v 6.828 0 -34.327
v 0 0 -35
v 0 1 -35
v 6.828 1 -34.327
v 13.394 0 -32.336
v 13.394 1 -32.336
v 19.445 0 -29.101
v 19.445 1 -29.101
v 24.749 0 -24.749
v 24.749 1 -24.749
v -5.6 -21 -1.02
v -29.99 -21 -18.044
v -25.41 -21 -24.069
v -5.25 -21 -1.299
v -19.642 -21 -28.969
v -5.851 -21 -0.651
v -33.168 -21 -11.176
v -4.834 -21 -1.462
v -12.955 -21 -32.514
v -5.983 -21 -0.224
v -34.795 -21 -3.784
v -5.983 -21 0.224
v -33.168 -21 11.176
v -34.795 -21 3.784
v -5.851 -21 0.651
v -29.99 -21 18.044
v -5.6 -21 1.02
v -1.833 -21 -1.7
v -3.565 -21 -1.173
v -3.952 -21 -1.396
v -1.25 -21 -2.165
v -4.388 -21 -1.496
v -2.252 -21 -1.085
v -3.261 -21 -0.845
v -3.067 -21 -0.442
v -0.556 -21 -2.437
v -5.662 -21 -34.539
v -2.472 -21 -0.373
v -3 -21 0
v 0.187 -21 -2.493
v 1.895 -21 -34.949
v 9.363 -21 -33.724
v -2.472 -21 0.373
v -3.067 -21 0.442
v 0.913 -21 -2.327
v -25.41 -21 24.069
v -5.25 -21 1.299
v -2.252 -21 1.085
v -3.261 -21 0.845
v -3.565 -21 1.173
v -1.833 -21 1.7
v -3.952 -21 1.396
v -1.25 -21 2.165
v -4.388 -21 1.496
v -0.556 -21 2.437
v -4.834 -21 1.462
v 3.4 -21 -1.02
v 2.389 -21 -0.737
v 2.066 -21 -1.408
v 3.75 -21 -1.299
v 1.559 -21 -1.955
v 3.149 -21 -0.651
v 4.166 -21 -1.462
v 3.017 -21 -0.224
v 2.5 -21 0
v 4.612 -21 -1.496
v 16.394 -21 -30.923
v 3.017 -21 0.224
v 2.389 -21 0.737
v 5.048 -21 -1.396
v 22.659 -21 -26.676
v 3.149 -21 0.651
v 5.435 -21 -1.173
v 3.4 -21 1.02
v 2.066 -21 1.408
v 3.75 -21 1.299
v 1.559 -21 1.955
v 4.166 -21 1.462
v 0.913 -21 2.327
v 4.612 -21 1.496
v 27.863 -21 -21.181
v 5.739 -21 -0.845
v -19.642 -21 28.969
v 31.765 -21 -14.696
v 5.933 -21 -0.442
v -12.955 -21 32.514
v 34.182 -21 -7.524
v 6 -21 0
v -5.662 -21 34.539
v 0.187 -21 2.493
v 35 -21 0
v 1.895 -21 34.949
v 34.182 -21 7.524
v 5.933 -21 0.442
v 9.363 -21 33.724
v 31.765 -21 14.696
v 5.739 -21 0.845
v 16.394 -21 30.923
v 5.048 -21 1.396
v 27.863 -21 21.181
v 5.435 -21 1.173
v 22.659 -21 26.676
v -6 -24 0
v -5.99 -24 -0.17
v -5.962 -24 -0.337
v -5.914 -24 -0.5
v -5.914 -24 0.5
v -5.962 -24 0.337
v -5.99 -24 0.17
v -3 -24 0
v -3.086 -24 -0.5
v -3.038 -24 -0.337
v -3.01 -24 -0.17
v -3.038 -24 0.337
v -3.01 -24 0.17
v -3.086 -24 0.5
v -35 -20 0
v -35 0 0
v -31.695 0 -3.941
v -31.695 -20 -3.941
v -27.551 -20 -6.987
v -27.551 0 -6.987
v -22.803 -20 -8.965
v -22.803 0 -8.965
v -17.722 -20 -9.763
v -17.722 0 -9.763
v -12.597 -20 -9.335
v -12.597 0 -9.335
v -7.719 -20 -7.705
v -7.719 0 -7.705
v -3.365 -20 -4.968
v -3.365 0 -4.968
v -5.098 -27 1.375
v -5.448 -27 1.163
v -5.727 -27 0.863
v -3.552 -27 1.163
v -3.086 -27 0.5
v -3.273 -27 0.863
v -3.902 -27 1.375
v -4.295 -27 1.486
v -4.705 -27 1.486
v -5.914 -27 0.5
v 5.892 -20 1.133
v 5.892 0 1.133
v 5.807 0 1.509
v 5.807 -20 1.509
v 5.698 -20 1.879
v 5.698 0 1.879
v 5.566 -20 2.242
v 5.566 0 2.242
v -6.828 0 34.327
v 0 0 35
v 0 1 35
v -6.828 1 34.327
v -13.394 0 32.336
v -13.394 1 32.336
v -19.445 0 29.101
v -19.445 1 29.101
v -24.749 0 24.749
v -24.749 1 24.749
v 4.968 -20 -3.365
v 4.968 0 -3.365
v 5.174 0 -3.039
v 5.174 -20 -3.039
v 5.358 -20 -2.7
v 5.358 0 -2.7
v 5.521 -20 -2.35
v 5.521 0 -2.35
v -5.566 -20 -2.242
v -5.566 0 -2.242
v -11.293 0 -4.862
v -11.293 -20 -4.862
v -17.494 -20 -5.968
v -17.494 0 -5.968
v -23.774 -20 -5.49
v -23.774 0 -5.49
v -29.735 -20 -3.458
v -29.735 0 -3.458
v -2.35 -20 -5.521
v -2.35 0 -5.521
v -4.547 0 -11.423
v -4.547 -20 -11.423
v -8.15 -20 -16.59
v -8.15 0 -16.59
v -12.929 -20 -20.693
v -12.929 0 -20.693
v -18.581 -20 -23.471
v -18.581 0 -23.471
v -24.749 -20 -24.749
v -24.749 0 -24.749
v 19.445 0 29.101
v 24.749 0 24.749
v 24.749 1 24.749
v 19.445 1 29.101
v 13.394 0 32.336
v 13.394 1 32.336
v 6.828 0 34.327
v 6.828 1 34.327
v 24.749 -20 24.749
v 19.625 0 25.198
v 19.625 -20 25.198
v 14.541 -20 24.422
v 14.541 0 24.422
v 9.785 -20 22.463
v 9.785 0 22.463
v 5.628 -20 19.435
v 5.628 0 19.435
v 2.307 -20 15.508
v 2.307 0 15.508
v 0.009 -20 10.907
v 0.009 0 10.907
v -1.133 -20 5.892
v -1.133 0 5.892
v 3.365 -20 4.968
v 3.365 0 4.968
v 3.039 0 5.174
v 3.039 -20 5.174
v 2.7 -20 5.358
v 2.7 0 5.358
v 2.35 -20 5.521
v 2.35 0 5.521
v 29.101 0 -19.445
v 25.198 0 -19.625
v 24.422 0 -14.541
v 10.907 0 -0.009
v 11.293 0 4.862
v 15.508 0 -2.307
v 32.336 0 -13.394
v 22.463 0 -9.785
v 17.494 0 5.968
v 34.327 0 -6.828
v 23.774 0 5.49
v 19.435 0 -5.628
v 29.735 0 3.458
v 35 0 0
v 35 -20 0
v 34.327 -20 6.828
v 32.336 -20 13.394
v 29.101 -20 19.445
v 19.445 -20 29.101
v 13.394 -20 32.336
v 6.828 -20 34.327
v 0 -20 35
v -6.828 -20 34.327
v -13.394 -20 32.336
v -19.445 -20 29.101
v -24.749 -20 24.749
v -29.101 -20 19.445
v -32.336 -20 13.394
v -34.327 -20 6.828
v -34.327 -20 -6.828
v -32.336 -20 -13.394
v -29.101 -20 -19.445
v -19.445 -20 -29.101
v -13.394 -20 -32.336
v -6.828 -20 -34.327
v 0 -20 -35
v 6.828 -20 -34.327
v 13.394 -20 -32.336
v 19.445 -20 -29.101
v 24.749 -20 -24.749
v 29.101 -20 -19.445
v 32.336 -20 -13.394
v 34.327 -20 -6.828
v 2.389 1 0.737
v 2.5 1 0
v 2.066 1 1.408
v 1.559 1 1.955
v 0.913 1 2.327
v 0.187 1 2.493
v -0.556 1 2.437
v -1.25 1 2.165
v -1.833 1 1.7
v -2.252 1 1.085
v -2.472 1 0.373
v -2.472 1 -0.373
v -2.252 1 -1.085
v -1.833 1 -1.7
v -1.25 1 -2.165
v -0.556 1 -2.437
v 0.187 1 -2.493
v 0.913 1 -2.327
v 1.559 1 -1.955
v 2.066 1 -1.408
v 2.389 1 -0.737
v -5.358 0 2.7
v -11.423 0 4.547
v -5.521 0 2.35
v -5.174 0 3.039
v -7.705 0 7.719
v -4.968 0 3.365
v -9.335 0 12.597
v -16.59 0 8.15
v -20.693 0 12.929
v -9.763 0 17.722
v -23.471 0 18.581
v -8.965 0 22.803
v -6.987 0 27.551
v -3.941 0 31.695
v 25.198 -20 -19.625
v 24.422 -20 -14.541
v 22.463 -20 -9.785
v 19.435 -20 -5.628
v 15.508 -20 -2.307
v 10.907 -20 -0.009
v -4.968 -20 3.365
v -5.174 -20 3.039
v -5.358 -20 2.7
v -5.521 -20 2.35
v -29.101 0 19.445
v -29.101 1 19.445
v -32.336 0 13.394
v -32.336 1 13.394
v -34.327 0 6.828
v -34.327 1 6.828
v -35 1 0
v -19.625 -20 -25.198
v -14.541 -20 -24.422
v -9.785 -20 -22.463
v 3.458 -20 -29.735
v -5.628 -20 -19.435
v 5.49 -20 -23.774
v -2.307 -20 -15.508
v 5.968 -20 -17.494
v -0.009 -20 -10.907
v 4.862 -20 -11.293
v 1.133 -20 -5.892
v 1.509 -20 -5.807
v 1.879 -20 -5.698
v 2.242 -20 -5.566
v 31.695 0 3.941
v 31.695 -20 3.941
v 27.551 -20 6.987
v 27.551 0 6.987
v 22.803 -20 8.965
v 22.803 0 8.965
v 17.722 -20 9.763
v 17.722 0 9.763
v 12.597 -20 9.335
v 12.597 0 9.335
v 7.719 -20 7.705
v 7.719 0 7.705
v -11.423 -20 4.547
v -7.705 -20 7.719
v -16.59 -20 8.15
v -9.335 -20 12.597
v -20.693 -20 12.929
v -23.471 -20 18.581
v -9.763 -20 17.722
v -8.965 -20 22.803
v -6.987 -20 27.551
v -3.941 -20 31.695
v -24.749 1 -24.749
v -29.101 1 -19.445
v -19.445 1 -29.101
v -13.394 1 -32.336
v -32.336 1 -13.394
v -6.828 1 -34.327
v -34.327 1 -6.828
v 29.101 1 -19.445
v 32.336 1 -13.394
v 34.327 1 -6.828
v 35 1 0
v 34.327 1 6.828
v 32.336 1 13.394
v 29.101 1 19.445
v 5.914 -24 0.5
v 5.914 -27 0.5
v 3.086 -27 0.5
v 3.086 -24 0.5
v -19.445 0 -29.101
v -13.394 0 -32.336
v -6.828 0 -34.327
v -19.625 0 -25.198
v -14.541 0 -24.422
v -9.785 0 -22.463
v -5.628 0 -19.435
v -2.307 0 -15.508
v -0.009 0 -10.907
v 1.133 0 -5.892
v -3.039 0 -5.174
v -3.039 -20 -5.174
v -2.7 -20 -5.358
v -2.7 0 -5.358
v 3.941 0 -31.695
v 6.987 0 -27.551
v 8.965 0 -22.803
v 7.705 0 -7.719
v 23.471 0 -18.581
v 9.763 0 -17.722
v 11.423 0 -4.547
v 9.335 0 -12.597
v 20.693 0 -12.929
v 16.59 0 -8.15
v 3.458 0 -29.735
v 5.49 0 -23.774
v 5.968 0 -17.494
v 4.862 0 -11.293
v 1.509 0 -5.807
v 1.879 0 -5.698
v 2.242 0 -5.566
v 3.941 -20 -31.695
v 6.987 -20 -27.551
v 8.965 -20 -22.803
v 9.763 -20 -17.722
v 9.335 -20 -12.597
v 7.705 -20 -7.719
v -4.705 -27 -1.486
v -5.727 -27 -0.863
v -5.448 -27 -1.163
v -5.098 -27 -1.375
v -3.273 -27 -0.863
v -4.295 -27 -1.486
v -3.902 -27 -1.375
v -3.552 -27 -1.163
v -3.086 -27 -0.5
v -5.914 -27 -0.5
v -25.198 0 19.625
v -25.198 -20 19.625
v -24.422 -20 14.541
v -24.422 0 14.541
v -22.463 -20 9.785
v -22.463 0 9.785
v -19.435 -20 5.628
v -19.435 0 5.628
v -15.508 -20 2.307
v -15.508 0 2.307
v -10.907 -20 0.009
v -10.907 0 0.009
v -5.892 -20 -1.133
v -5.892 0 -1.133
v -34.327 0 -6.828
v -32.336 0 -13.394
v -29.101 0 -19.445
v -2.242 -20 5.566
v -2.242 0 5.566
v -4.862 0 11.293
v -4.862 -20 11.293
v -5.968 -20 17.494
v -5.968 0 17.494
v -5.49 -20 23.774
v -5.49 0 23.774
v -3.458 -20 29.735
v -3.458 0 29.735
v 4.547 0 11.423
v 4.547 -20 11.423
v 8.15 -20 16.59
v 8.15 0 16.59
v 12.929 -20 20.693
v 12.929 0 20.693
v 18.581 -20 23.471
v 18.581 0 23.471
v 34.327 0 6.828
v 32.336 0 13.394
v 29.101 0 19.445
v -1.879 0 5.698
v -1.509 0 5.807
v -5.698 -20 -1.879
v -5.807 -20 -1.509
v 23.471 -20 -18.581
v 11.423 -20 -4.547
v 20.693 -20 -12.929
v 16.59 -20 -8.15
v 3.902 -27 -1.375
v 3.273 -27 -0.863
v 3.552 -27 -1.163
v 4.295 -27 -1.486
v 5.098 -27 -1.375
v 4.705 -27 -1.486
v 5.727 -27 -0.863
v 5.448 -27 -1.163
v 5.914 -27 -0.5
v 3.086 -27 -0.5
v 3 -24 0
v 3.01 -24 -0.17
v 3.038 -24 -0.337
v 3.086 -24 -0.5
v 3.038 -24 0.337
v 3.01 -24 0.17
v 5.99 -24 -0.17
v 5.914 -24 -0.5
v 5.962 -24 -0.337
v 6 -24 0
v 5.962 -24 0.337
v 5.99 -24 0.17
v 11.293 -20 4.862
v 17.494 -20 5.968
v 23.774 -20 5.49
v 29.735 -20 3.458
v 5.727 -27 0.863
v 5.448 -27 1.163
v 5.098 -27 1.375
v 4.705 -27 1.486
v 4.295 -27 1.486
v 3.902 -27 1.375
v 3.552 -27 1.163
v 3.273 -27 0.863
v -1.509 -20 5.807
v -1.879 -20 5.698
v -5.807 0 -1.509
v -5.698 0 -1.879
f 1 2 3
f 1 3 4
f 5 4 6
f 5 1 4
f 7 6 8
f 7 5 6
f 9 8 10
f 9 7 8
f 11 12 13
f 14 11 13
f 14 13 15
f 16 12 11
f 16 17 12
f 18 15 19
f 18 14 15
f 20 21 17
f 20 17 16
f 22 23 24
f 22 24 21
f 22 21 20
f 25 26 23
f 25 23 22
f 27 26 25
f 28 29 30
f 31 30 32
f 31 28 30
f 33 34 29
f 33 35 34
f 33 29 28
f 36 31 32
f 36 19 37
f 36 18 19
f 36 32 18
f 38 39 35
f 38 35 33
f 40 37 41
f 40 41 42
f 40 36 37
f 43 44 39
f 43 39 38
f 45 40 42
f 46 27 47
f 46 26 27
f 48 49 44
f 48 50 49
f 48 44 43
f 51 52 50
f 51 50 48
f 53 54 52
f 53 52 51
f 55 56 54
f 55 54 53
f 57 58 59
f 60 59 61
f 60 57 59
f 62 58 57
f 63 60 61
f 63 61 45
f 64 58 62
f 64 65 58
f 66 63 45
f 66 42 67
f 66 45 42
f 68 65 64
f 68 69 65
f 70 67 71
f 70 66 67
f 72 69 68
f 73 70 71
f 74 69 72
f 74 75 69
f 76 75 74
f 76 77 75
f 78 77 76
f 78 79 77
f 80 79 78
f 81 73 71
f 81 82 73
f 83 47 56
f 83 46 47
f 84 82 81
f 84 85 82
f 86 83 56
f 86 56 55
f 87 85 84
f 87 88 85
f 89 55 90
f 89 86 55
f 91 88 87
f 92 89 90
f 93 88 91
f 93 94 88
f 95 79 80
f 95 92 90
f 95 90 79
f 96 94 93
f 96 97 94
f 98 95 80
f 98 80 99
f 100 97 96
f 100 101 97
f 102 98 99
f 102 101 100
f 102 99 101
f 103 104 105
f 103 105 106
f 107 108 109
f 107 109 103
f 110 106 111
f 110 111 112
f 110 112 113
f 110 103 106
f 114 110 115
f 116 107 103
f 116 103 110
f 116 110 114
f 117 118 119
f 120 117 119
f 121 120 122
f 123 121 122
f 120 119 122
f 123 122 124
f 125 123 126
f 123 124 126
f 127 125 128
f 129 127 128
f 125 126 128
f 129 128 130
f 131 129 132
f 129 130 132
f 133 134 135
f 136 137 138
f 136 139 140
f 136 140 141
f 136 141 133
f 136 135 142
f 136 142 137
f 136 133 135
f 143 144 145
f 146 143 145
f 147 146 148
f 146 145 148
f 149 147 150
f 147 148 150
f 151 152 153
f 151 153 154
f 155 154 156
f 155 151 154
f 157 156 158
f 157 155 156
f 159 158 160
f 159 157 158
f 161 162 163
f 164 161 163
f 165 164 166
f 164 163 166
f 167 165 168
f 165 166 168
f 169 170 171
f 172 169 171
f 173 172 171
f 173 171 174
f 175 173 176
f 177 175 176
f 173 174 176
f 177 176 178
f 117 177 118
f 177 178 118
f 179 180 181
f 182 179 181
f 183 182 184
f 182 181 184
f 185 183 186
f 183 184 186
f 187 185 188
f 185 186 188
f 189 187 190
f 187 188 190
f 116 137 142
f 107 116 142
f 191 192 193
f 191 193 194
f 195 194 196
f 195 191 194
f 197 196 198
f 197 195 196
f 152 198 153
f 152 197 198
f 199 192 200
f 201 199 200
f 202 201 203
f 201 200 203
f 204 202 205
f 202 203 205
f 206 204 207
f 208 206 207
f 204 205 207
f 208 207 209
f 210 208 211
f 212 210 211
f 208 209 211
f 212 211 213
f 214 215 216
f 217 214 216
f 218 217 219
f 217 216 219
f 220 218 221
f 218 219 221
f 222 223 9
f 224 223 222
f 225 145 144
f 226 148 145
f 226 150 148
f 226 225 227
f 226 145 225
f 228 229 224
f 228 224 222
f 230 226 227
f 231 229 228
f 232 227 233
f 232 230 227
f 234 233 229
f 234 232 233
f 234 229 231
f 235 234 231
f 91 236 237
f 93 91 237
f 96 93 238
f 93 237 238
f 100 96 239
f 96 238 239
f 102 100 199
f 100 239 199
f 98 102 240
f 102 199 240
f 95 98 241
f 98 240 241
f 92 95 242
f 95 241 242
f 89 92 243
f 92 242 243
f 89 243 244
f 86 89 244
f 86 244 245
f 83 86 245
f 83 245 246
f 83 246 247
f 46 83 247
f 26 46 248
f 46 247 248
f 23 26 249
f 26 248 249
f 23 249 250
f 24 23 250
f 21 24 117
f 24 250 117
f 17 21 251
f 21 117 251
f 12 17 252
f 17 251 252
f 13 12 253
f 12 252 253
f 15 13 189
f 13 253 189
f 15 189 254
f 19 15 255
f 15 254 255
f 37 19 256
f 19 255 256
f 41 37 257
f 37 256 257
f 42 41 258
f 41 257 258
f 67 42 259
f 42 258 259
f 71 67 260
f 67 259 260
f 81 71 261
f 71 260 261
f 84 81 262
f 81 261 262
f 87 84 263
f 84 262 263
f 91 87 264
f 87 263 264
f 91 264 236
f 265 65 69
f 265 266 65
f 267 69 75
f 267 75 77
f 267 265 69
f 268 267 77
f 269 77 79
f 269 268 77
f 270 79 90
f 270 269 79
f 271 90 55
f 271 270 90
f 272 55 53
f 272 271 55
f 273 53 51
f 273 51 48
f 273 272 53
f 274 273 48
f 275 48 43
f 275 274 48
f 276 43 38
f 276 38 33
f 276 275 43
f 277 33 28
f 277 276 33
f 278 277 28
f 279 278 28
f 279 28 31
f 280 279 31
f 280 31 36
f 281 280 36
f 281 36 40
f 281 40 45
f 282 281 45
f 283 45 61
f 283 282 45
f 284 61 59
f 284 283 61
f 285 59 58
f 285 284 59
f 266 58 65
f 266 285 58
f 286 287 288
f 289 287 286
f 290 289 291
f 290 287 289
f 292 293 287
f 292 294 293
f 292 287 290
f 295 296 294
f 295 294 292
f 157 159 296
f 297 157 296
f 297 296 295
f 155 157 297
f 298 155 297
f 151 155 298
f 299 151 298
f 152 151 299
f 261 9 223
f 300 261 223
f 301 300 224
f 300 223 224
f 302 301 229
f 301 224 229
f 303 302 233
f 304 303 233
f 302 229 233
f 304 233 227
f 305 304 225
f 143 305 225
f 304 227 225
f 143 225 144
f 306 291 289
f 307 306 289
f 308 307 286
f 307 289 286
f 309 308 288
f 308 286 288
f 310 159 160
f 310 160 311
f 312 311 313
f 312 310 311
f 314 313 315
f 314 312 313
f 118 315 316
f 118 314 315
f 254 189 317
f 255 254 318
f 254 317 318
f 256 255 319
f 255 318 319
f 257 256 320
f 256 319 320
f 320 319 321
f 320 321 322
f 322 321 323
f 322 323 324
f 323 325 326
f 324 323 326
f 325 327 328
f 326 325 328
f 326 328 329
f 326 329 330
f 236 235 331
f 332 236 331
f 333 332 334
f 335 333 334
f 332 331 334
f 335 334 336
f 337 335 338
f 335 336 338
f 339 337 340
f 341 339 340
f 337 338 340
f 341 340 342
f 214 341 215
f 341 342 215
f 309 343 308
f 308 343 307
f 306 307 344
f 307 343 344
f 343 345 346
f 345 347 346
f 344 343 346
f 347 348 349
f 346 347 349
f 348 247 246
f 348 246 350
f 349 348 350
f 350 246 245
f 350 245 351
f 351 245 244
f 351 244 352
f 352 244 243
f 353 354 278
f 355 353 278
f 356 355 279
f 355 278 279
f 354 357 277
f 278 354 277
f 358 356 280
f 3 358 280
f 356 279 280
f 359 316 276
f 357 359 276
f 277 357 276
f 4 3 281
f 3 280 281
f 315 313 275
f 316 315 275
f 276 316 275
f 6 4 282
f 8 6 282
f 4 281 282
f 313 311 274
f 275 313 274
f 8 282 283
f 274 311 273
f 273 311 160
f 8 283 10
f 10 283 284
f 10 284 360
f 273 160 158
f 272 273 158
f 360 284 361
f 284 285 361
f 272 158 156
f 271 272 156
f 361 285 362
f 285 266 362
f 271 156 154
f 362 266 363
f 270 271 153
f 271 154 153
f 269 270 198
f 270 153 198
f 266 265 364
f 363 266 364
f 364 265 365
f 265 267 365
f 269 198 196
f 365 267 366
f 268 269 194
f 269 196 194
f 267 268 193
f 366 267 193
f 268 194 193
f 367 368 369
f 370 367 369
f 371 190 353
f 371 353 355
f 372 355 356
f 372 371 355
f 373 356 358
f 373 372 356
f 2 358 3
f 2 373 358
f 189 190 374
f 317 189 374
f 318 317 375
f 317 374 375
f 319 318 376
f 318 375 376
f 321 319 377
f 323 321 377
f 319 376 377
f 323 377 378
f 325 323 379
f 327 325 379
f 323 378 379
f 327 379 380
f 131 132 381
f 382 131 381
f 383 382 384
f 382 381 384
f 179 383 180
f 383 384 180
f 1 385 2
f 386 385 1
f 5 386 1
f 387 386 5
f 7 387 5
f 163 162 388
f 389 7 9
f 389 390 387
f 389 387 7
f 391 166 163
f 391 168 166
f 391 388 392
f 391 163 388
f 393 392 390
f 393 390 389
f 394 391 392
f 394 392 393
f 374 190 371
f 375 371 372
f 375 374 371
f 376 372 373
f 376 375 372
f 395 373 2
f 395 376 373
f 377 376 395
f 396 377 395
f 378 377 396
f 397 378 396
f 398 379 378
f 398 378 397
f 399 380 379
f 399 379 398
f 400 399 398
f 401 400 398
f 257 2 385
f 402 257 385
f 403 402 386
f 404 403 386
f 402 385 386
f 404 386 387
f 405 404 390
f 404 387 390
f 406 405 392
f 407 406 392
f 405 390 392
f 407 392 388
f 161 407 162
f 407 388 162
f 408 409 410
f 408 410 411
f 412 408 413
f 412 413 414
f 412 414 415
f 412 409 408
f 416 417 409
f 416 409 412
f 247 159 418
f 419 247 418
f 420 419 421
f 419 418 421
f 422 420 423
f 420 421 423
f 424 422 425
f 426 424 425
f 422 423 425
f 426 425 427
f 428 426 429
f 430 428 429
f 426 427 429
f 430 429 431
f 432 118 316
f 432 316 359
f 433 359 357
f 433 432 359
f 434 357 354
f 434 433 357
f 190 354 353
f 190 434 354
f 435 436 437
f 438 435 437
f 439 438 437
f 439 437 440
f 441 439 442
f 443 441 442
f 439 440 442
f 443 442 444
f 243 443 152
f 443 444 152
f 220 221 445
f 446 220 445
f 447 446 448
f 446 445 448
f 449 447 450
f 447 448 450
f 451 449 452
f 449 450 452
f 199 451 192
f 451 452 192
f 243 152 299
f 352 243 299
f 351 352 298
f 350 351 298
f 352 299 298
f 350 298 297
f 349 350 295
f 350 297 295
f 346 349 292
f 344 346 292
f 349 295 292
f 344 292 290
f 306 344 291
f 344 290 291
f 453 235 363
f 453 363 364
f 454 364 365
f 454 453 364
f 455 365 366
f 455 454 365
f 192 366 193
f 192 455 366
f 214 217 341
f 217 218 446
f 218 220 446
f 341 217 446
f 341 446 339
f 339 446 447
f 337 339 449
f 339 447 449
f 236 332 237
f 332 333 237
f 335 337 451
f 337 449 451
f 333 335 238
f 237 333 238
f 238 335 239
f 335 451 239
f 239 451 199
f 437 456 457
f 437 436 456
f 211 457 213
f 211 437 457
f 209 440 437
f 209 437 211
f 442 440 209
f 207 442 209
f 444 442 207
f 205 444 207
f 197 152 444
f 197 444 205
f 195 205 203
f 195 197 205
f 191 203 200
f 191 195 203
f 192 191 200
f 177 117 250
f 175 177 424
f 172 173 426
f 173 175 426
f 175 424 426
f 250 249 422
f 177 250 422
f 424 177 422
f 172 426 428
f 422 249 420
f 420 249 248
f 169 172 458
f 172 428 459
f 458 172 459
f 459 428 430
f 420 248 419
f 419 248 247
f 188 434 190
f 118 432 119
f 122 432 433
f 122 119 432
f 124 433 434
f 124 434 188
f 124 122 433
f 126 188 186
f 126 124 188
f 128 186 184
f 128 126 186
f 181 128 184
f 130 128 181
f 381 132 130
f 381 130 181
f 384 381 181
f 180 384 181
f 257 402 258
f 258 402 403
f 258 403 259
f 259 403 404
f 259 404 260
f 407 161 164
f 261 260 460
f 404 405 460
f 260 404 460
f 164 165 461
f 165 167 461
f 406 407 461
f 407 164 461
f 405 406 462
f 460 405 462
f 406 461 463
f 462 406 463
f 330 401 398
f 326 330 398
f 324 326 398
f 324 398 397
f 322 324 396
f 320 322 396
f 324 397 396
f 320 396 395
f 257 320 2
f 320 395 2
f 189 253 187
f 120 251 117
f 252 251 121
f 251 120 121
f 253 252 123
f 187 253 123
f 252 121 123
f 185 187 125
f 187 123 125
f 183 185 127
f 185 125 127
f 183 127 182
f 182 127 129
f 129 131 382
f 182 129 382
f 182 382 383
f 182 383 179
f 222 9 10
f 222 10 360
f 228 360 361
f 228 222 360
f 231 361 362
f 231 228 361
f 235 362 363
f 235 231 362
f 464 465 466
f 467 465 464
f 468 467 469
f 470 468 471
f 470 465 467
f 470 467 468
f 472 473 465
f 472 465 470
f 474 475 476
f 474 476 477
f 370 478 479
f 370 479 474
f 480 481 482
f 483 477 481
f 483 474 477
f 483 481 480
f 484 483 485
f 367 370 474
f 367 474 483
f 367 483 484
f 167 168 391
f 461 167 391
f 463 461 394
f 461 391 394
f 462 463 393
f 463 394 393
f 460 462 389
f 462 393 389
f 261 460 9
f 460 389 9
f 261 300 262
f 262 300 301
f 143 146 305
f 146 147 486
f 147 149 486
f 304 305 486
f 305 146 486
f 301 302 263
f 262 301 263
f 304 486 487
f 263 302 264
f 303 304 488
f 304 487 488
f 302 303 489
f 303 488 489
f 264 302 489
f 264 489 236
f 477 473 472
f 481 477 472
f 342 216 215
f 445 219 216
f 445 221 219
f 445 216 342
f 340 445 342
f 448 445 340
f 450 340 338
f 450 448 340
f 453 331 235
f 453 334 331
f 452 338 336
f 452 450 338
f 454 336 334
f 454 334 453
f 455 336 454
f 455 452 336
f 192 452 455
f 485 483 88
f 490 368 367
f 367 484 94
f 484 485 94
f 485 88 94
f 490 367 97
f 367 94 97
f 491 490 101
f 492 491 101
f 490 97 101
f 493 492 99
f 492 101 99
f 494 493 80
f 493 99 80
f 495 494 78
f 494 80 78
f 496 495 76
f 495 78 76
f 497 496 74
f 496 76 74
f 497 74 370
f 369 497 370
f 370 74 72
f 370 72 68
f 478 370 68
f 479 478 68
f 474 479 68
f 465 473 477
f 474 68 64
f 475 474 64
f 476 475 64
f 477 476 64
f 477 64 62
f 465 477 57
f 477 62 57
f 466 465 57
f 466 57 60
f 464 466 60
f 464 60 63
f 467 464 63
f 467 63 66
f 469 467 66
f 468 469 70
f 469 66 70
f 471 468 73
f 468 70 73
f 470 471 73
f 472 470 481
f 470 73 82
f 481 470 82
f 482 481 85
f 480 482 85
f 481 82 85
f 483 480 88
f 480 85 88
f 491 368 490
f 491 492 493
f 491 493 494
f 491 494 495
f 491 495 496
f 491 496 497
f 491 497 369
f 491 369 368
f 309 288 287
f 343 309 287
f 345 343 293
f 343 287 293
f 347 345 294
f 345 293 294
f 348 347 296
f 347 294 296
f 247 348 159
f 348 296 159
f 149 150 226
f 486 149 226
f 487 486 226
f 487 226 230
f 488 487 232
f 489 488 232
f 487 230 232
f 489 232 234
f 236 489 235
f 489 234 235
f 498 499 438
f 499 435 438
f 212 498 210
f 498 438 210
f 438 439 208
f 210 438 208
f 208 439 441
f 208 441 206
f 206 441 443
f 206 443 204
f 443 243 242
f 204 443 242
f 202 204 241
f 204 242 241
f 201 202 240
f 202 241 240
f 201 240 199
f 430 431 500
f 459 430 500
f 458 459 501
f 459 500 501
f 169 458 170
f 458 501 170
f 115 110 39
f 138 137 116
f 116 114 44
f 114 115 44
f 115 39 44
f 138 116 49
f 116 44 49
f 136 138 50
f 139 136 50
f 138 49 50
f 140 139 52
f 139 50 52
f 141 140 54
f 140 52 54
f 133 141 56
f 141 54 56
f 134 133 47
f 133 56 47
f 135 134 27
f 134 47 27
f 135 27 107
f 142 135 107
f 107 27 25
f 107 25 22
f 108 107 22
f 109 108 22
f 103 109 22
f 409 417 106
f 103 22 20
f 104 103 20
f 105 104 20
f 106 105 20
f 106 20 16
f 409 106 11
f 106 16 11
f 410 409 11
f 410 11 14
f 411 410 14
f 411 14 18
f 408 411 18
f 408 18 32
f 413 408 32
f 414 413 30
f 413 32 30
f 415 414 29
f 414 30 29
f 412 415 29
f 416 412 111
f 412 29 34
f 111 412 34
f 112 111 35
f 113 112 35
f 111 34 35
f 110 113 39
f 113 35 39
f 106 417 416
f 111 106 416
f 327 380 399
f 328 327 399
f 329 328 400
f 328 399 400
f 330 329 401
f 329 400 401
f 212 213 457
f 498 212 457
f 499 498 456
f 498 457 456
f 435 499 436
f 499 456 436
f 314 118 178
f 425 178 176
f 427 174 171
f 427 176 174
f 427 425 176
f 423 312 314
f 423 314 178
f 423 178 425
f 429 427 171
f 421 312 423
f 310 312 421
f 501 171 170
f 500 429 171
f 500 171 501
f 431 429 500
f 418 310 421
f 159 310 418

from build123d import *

# Parameters (mm, degrees)
F0_R     = 2.5
F1_DEPTH = 20
F2_DEPTH = 1
F3_R     = 35
F3_R_2   = 1.5
F3_R_3   = 2.5
F4_DEPTH = 1
F5_DEPTH = 7
F8_DEPTH = 3


with BuildPart() as f1:
    # F0 (on Front) → F1 (new body)
    with BuildSketch(Plane.XZ):
        with BuildLine():
            ThreePointArc((5.5655123118, 2.2416673945), (20.6488442828, 5.9277985889), (35, 0))
            ThreePointArc((35, 0), (20.2866870884, 9.5155994681), (3.3649940235, 4.9675763931))
            ThreePointArc((3.3649940235, 4.9675763931), (2.8709960308, 5.2685274784), (2.3503132806, 5.5205097122))
            ThreePointArc((2.3503132806, 5.5205097122), (10.4093512363, 18.7925243957), (24.7487373415, 24.7487373415))
            ThreePointArc((24.7487373415, 24.7487373415), (7.6163090971, 21.073398919), (-1.133196861, 5.8920170463))
            ThreePointArc((-1.133196861, 5.8920170463), (-1.6953107447, 5.755512269), (-2.2416673945, 5.5655123118))
            ThreePointArc((-2.2416673945, 5.5655123118), (-5.9277985889, 20.6488442828), (0, 35))
            ThreePointArc((0, 35), (-9.5155994681, 20.2866870884), (-4.9675763931, 3.3649940235))
            ThreePointArc((-4.9675763931, 3.3649940235), (-5.2685274784, 2.8709960308), (-5.5205097122, 2.3503132806))
            ThreePointArc((-5.5205097122, 2.3503132806), (-18.7925243957, 10.4093512363), (-24.7487373415, 24.7487373415))
            ThreePointArc((-24.7487373415, 24.7487373415), (-21.073398919, 7.6163090971), (-5.8920170463, -1.133196861))
            ThreePointArc((-5.8920170463, -1.133196861), (-5.755512269, -1.6953107447), (-5.5655123118, -2.2416673945))
            ThreePointArc((-5.5655123118, -2.2416673945), (-20.6488442828, -5.9277985889), (-35, 0))
            ThreePointArc((-35, 0), (-20.2866870884, -9.5155994681), (-3.3649940235, -4.9675763931))
            ThreePointArc((-3.3649940235, -4.9675763931), (-2.8709960308, -5.2685274784), (-2.3503132806, -5.5205097122))
            ThreePointArc((-2.3503132806, -5.5205097122), (-10.4093512363, -18.7925243957), (-24.7487373415, -24.7487373415))
            ThreePointArc((-24.7487373415, -24.7487373415), (-7.6163090971, -21.073398919), (1.133196861, -5.8920170463))
            ThreePointArc((1.133196861, -5.8920170463), (1.6953107447, -5.755512269), (2.2416673945, -5.5655123118))
            ThreePointArc((2.2416673945, -5.5655123118), (5.9277985889, -20.6488442828), (0, -35))
            ThreePointArc((0, -35), (9.5155994681, -20.2866870884), (4.9675763931, -3.3649940235))
            ThreePointArc((4.9675763931, -3.3649940235), (5.2685274784, -2.8709960308), (5.5205097122, -2.3503132806))
            ThreePointArc((5.5205097122, -2.3503132806), (18.7925243957, -10.4093512363), (24.7487373415, -24.7487373415))
            ThreePointArc((24.7487373415, -24.7487373415), (21.073398919, -7.6163090971), (5.8920170463, 1.133196861))
            ThreePointArc((5.8920170463, 1.133196861), (5.755512269, 1.6953107447), (5.5655123118, 2.2416673945))
        make_face()
        Circle(F0_R, mode=Mode.SUBTRACT)
    extrude(amount=F1_DEPTH)

    # F0 (on Front) → F2 (join)
    with BuildSketch(Plane.XZ):
        with BuildLine():
            ThreePointArc((3.3649940235, 4.9675763931), (20.2866870884, 9.5155994681), (35, 0))
            ThreePointArc((35, 0), (32.3357836379, 13.3939201328), (24.7487373415, 24.7487373415))
            ThreePointArc((24.7487373415, 24.7487373415), (10.4093512363, 18.7925243957), (2.3503132806, 5.5205097122))
            ThreePointArc((2.3503132806, 5.5205097122), (2.8709960308, 5.2685274784), (3.3649940235, 4.9675763931))
        make_face()
        with BuildLine():
            ThreePointArc((5.5655123118, 2.2416673945), (20.6488442828, 5.9277985889), (35, 0))
            ThreePointArc((35, 0), (20.2866870884, 9.5155994681), (3.3649940235, 4.9675763931))
            ThreePointArc((3.3649940235, 4.9675763931), (2.8709960308, 5.2685274784), (2.3503132806, 5.5205097122))
            ThreePointArc((2.3503132806, 5.5205097122), (10.4093512363, 18.7925243957), (24.7487373415, 24.7487373415))
            ThreePointArc((24.7487373415, 24.7487373415), (7.6163090971, 21.073398919), (-1.133196861, 5.8920170463))
            ThreePointArc((-1.133196861, 5.8920170463), (-1.6953107447, 5.755512269), (-2.2416673945, 5.5655123118))
            ThreePointArc((-2.2416673945, 5.5655123118), (-5.9277985889, 20.6488442828), (0, 35))
            ThreePointArc((0, 35), (-9.5155994681, 20.2866870884), (-4.9675763931, 3.3649940235))
            ThreePointArc((-4.9675763931, 3.3649940235), (-5.2685274784, 2.8709960308), (-5.5205097122, 2.3503132806))
            ThreePointArc((-5.5205097122, 2.3503132806), (-18.7925243957, 10.4093512363), (-24.7487373415, 24.7487373415))
            ThreePointArc((-24.7487373415, 24.7487373415), (-21.073398919, 7.6163090971), (-5.8920170463, -1.133196861))
            ThreePointArc((-5.8920170463, -1.133196861), (-5.755512269, -1.6953107447), (-5.5655123118, -2.2416673945))
            ThreePointArc((-5.5655123118, -2.2416673945), (-20.6488442828, -5.9277985889), (-35, 0))
            ThreePointArc((-35, 0), (-20.2866870884, -9.5155994681), (-3.3649940235, -4.9675763931))
            ThreePointArc((-3.3649940235, -4.9675763931), (-2.8709960308, -5.2685274784), (-2.3503132806, -5.5205097122))
            ThreePointArc((-2.3503132806, -5.5205097122), (-10.4093512363, -18.7925243957), (-24.7487373415, -24.7487373415))
            ThreePointArc((-24.7487373415, -24.7487373415), (-7.6163090971, -21.073398919), (1.133196861, -5.8920170463))
            ThreePointArc((1.133196861, -5.8920170463), (1.6953107447, -5.755512269), (2.2416673945, -5.5655123118))
            ThreePointArc((2.2416673945, -5.5655123118), (5.9277985889, -20.6488442828), (0, -35))
            ThreePointArc((0, -35), (9.5155994681, -20.2866870884), (4.9675763931, -3.3649940235))
            ThreePointArc((4.9675763931, -3.3649940235), (5.2685274784, -2.8709960308), (5.5205097122, -2.3503132806))
            ThreePointArc((5.5205097122, -2.3503132806), (18.7925243957, -10.4093512363), (24.7487373415, -24.7487373415))
            ThreePointArc((24.7487373415, -24.7487373415), (21.073398919, -7.6163090971), (5.8920170463, 1.133196861))
            ThreePointArc((5.8920170463, 1.133196861), (5.755512269, 1.6953107447), (5.5655123118, 2.2416673945))
        make_face()
        Circle(F0_R, mode=Mode.SUBTRACT)
        with BuildLine():
            ThreePointArc((24.7487373415, -24.7487373415), (32.3357836379, -13.3939201328), (35, 0))
            ThreePointArc((35, 0), (20.6488442828, 5.9277985889), (5.5655123118, 2.2416673945))
            ThreePointArc((5.5655123118, 2.2416673945), (5.755512269, 1.6953107447), (5.8920170463, 1.133196861))
            ThreePointArc((5.8920170463, 1.133196861), (21.073398919, -7.6163090971), (24.7487373415, -24.7487373415))
        make_face()
        with BuildLine():
            ThreePointArc((-1.133196861, 5.8920170463), (7.6163090971, 21.073398919), (24.7487373415, 24.7487373415))
            ThreePointArc((24.7487373415, 24.7487373415), (13.3939201328, 32.3357836379), (0, 35))
            ThreePointArc((0, 35), (-5.9277985889, 20.6488442828), (-2.2416673945, 5.5655123118))
            ThreePointArc((-2.2416673945, 5.5655123118), (-1.6953107447, 5.755512269), (-1.133196861, 5.8920170463))
        make_face()
        with BuildLine():
            ThreePointArc((0, -35), (13.3939201328, -32.3357836379), (24.7487373415, -24.7487373415))
            ThreePointArc((24.7487373415, -24.7487373415), (18.7925243957, -10.4093512363), (5.5205097122, -2.3503132806))
            ThreePointArc((5.5205097122, -2.3503132806), (5.2685274784, -2.8709960308), (4.9675763931, -3.3649940235))
            ThreePointArc((4.9675763931, -3.3649940235), (9.5155994681, -20.2866870884), (0, -35))
        make_face()
        with BuildLine():
            ThreePointArc((-4.9675763931, 3.3649940235), (-9.5155994681, 20.2866870884), (0, 35))
            ThreePointArc((0, 35), (-13.3939201328, 32.3357836379), (-24.7487373415, 24.7487373415))
            ThreePointArc((-24.7487373415, 24.7487373415), (-18.7925243957, 10.4093512363), (-5.5205097122, 2.3503132806))
            ThreePointArc((-5.5205097122, 2.3503132806), (-5.2685274784, 2.8709960308), (-4.9675763931, 3.3649940235))
        make_face()
        with BuildLine():
            ThreePointArc((-24.7487373415, -24.7487373415), (-13.3939201328, -32.3357836379), (0, -35))
            ThreePointArc((0, -35), (5.9277985889, -20.6488442828), (2.2416673945, -5.5655123118))
            ThreePointArc((2.2416673945, -5.5655123118), (1.6953107447, -5.755512269), (1.133196861, -5.8920170463))
            ThreePointArc((1.133196861, -5.8920170463), (-7.6163090971, -21.073398919), (-24.7487373415, -24.7487373415))
        make_face()
        with BuildLine():
            ThreePointArc((-5.8920170463, -1.133196861), (-21.073398919, 7.6163090971), (-24.7487373415, 24.7487373415))
            ThreePointArc((-24.7487373415, 24.7487373415), (-32.3357836379, 13.3939201328), (-35, 0))
            ThreePointArc((-35, 0), (-20.6488442828, -5.9277985889), (-5.5655123118, -2.2416673945))
            ThreePointArc((-5.5655123118, -2.2416673945), (-5.755512269, -1.6953107447), (-5.8920170463, -1.133196861))
        make_face()
        with BuildLine():
            ThreePointArc((-35, 0), (-32.3357836379, -13.3939201328), (-24.7487373415, -24.7487373415))
            ThreePointArc((-24.7487373415, -24.7487373415), (-10.4093512363, -18.7925243957), (-2.3503132806, -5.5205097122))
            ThreePointArc((-2.3503132806, -5.5205097122), (-2.8709960308, -5.2685274784), (-3.3649940235, -4.9675763931))
            ThreePointArc((-3.3649940235, -4.9675763931), (-20.2866870884, -9.5155994681), (-35, 0))
        make_face()
    extrude(amount=-F2_DEPTH)

    # F3 (on face) → F4 (join)
    with BuildSketch(Plane.XZ.offset(20)):
        Circle(F3_R)
        with Locations((-4.5, 0)):
            Circle(F3_R_2, mode=Mode.SUBTRACT)
        Circle(F3_R_3, mode=Mode.SUBTRACT)
        with Locations((4.5, 0)):
            Circle(F3_R_2, mode=Mode.SUBTRACT)
    extrude(amount=F4_DEPTH)

    # F5 (add): faces of the model
    f5_faces = [f1.faces().sort_by_distance(p)[0] for p in [
        (4.5, -20, 0),
        (-4.5, -20, 0),
    ]]
    extrude(f5_faces, amount=F5_DEPTH)

    # F6 (on face) + F7 (on face) → F8 (cut)
    with BuildSketch(Plane.XZ.offset(27)):
        with BuildLine():
            Line((-3.0857864376, 0.5), (-5.9142135624, 0.5))
            ThreePointArc((-5.9142135624, 0.5), (-5.9783978395, 0.2536529681), (-6, 0))
            ThreePointArc((-6, 0), (-5.9783978395, -0.2536529681), (-5.9142135624, -0.5))
            Line((-5.9142135624, -0.5), (-3.0857864376, -0.5))
            ThreePointArc((-3.0857864376, -0.5), (-3.0216021605, -0.2536529681), (-3, 0))
            ThreePointArc((-3, 0), (-3.0216021605, 0.2536529681), (-3.0857864376, 0.5))
        make_face()
        with BuildLine():
            Line((-3, 0.5), (-3.0857864376, 0.5))
            ThreePointArc((-3.0857864376, 0.5), (-3.0216021605, 0.2536529681), (-3, 0))
            Line((-3, 0), (-3, 0.5))
        make_face()
    with BuildSketch(Plane.XZ.offset(27)):
        with BuildLine():
            Line((5.9142135624, 0.5), (3.0857864376, 0.5))
            ThreePointArc((3.0857864376, 0.5), (3.0216021605, 0.2536529681), (3, 0))
            ThreePointArc((3, 0), (3.0216021605, -0.2536529681), (3.0857864376, -0.5))
            Line((3.0857864376, -0.5), (5.9142135624, -0.5))
            ThreePointArc((5.9142135624, -0.5), (5.9783978395, -0.2536529681), (6, 0))
            ThreePointArc((6, 0), (5.9783978395, 0.2536529681), (5.9142135624, 0.5))
        make_face()
        with BuildLine():
            Line((6, 0.5), (5.9142135624, 0.5))
            ThreePointArc((5.9142135624, 0.5), (5.9783978395, 0.2536529681), (6, 0))
            Line((6, 0), (6, 0.5))
        make_face()
    extrude(amount=-F8_DEPTH, mode=Mode.SUBTRACT)


solid = f1.part
